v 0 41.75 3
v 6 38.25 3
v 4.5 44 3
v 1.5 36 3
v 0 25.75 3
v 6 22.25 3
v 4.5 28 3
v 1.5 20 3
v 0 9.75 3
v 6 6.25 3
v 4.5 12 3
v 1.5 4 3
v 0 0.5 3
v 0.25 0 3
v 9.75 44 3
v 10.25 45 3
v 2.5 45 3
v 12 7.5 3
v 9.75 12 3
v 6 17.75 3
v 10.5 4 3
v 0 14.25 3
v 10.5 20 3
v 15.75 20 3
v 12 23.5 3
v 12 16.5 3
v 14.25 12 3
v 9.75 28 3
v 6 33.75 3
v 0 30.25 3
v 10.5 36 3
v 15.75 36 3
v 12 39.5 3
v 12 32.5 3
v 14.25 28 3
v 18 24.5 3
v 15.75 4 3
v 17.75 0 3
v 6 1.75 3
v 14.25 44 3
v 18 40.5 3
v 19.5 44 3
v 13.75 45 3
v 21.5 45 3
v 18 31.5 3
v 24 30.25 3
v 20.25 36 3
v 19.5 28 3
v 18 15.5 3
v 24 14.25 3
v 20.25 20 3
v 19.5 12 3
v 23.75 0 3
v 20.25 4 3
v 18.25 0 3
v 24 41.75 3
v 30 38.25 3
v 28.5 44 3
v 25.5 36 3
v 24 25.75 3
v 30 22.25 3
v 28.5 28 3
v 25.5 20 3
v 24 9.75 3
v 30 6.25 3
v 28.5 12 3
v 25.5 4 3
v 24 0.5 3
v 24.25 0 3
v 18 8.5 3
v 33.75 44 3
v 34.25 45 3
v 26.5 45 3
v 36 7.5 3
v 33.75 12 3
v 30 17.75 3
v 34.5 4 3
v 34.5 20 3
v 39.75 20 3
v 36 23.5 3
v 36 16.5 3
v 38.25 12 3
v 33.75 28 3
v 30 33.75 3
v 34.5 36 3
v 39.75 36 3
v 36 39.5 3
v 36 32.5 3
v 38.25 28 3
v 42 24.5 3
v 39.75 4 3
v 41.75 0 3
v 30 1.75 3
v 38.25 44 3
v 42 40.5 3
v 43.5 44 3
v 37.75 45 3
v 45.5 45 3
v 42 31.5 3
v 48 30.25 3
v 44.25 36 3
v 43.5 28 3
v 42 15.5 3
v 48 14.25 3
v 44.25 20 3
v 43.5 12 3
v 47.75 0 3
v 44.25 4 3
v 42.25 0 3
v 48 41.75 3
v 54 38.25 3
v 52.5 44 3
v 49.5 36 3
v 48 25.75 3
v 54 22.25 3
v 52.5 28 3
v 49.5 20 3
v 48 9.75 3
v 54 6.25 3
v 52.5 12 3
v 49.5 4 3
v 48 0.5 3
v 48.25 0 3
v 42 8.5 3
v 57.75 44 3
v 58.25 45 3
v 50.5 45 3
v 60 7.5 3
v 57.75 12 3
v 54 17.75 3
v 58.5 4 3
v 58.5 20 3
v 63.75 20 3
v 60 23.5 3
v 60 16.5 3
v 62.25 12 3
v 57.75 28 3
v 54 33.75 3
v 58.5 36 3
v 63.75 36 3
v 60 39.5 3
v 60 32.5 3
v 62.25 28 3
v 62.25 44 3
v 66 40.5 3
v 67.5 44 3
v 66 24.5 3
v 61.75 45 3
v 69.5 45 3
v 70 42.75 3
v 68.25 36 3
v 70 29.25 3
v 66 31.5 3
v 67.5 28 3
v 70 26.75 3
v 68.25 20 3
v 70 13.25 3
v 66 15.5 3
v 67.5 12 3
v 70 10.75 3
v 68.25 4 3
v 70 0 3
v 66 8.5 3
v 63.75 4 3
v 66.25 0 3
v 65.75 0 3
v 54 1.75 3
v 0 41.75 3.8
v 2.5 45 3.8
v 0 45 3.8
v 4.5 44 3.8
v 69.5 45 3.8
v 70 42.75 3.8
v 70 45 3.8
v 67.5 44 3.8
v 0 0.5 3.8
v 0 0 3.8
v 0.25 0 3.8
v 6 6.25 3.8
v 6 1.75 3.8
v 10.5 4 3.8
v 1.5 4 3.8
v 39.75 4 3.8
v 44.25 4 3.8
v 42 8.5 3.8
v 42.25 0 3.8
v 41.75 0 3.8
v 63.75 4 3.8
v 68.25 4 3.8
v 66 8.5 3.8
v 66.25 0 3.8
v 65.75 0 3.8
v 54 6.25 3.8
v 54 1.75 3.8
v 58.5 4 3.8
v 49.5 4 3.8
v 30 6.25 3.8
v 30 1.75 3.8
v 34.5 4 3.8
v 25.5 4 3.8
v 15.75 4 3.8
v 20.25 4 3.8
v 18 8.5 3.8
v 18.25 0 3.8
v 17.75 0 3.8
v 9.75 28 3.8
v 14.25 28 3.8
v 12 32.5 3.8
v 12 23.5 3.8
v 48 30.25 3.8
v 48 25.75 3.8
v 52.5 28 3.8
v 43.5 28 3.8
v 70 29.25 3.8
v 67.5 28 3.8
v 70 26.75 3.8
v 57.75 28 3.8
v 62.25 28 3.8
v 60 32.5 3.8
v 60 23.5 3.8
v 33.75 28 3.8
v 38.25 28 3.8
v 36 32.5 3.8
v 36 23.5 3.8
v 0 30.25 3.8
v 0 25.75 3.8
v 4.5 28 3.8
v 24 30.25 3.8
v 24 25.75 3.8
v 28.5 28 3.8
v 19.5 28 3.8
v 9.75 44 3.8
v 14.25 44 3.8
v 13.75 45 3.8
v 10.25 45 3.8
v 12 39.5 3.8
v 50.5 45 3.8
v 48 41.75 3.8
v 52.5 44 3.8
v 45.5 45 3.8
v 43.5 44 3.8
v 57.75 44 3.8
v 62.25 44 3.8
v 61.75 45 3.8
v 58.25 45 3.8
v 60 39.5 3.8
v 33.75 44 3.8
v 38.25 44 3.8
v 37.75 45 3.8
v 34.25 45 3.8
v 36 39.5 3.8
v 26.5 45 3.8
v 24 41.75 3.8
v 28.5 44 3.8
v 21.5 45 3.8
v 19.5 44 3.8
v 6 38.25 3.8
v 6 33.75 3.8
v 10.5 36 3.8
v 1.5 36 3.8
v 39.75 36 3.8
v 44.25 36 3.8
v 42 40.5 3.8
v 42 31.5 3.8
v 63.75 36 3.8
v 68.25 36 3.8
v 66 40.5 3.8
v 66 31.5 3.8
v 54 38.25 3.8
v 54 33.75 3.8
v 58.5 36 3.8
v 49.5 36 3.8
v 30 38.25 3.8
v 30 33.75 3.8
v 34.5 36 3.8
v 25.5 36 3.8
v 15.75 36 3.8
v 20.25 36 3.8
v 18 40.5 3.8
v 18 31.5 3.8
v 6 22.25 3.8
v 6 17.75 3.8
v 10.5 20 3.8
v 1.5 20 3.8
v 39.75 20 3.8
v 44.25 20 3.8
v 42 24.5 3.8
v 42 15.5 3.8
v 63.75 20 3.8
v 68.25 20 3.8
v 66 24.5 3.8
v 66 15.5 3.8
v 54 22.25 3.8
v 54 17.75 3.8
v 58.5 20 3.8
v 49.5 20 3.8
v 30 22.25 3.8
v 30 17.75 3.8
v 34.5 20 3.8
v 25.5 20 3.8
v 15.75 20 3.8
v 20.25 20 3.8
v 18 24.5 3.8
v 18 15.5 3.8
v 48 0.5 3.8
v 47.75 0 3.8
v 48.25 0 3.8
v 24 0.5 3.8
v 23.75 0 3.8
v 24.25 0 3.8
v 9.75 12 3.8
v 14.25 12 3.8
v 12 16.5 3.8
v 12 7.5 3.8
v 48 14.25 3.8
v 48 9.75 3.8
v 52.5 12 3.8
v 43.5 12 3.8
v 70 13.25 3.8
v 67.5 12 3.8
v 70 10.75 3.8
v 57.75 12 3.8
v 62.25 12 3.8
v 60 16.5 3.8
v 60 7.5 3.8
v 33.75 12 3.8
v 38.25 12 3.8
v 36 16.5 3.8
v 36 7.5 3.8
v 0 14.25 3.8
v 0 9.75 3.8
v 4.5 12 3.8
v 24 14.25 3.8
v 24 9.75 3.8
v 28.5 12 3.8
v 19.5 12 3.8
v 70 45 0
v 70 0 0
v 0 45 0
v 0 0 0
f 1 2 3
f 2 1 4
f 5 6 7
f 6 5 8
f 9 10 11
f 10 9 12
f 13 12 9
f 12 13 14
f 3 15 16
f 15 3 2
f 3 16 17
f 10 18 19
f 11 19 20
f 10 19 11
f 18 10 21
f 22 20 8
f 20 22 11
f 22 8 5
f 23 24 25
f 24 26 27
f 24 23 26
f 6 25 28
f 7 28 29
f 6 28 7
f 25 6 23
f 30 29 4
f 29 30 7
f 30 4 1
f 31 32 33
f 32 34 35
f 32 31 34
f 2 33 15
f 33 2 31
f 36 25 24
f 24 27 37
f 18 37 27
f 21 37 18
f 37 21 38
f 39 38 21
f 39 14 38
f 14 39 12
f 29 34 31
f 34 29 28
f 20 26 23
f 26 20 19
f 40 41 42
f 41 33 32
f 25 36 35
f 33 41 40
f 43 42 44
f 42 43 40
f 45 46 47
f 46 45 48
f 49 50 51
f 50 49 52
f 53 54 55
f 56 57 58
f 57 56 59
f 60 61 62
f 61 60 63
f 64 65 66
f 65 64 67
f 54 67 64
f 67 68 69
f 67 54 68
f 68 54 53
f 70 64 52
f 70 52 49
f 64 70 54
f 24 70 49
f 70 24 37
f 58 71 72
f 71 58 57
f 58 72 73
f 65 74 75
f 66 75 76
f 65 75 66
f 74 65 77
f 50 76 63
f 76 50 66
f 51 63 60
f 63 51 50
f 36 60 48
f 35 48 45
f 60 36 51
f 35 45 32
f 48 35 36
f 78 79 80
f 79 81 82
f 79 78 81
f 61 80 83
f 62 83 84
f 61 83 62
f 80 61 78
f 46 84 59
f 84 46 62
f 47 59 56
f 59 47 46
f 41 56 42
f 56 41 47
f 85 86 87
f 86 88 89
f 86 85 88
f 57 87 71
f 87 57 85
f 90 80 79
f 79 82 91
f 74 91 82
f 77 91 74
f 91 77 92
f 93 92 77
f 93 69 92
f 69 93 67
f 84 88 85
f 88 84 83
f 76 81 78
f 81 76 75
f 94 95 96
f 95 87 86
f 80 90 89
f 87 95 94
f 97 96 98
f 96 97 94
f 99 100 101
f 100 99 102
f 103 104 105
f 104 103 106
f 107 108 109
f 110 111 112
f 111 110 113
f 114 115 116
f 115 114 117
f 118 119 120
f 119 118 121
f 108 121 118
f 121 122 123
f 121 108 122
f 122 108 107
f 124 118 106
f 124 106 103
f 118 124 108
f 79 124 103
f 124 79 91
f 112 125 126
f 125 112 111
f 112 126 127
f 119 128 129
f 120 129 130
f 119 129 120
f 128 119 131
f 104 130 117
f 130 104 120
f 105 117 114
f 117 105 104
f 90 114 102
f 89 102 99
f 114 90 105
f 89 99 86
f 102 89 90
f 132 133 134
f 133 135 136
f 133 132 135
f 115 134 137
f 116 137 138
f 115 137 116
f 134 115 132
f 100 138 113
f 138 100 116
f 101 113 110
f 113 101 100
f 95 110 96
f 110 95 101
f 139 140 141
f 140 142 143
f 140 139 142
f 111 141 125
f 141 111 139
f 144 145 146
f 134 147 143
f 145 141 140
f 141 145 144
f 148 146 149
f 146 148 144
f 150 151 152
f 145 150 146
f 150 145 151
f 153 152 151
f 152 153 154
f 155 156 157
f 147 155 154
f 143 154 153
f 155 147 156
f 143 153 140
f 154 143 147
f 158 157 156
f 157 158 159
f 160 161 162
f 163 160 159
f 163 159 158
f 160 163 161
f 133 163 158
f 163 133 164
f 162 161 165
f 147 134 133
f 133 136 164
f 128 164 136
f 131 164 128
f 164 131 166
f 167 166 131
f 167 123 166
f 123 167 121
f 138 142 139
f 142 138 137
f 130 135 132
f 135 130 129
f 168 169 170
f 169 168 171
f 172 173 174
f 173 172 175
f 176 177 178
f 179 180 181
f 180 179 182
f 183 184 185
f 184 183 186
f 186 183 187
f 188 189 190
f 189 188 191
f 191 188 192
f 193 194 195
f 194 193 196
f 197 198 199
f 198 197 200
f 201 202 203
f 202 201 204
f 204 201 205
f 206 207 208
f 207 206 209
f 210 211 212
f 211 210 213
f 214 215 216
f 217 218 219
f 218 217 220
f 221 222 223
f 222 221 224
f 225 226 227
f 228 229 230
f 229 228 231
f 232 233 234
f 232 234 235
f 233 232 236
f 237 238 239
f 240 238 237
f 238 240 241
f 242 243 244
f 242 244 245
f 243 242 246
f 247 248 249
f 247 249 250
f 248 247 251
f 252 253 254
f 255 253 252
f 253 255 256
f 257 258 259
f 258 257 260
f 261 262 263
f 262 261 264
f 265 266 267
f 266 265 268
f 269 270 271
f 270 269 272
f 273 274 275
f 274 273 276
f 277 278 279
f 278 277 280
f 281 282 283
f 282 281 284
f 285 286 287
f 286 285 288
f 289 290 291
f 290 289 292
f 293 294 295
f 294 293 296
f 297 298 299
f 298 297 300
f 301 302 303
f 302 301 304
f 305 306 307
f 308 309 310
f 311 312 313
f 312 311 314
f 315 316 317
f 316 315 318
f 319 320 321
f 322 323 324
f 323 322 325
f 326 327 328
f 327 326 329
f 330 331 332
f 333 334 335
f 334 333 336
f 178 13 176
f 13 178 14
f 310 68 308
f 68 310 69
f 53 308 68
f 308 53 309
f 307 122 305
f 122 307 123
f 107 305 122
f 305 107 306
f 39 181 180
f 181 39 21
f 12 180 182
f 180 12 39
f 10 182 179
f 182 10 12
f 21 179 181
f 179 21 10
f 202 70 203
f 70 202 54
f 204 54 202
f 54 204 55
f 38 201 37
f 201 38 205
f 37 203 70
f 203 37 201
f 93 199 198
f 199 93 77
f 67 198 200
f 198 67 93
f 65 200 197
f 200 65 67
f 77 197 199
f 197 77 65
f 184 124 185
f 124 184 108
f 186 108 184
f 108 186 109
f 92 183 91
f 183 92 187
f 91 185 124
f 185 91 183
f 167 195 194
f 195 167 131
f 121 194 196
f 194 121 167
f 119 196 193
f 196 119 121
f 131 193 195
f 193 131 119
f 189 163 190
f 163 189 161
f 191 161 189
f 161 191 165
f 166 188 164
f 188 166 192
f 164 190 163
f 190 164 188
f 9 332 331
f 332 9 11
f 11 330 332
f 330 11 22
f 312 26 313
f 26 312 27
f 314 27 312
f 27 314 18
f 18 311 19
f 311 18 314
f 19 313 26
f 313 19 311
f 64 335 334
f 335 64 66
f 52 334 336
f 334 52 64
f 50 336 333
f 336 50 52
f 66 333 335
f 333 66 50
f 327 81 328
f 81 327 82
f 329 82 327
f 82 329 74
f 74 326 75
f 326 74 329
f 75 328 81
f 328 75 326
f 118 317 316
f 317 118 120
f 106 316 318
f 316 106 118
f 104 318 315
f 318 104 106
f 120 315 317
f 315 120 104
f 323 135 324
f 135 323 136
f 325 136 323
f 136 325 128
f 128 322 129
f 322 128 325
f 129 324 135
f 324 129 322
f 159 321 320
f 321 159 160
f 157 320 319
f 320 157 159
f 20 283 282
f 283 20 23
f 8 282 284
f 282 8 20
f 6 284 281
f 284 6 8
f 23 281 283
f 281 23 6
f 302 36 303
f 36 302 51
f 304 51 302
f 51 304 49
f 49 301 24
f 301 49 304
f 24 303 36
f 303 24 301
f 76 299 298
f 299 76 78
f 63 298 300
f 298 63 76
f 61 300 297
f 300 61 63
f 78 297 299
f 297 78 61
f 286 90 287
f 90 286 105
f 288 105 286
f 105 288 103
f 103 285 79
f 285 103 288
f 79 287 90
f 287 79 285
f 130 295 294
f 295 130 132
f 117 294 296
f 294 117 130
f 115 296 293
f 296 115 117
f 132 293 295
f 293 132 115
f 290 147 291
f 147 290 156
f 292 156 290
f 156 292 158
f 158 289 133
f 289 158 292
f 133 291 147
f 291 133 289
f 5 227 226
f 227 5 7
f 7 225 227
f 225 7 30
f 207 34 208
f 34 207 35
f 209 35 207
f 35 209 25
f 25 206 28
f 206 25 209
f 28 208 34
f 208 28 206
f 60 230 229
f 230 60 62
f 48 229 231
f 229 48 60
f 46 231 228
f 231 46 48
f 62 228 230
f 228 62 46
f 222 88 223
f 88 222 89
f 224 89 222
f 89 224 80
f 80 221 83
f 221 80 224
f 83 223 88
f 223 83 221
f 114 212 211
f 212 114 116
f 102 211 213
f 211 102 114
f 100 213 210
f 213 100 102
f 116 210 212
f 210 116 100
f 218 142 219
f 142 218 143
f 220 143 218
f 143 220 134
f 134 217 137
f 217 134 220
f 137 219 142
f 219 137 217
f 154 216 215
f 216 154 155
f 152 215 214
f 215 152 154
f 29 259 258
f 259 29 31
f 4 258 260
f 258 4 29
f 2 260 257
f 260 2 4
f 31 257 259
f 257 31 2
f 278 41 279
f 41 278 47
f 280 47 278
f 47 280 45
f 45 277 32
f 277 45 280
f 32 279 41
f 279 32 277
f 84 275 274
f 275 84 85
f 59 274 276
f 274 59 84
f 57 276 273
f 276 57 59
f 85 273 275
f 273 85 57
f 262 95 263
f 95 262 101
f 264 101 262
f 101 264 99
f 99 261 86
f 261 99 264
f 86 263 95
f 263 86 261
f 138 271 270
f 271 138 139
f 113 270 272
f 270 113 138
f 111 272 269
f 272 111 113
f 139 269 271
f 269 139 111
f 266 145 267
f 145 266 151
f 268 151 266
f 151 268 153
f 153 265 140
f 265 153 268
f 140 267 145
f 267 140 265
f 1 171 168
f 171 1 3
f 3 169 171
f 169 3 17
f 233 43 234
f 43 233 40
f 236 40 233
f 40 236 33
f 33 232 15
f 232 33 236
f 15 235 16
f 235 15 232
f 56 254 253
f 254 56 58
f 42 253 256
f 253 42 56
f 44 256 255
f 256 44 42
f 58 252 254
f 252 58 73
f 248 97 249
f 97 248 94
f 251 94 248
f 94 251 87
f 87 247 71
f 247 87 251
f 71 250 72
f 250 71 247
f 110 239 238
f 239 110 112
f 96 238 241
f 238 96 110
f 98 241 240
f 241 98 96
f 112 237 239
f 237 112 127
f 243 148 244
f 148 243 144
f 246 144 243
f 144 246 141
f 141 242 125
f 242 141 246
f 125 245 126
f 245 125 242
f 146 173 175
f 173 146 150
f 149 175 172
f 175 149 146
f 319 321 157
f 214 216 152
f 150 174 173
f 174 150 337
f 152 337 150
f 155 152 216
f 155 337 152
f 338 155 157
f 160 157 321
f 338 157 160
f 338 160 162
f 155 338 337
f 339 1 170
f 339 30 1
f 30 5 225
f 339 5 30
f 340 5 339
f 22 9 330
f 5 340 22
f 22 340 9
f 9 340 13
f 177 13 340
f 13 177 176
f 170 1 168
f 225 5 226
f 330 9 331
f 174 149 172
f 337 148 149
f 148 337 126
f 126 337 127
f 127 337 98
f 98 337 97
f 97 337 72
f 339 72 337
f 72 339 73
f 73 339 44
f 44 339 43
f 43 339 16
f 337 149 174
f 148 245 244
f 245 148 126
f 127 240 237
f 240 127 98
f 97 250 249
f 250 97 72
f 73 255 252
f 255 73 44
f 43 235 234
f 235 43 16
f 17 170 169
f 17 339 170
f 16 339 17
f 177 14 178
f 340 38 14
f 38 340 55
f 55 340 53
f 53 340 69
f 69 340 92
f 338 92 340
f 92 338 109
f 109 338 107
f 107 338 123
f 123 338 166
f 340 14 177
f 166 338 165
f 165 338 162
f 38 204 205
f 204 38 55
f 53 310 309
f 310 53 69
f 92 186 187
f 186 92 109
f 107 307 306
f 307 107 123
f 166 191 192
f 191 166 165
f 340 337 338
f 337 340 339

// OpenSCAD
// Flat plate with a raised diamond tread pattern.
//$preview = true;
$fa = $preview ? 16 : 1;
$fs = $preview ? 3 : 0.15;

tread_width = 70;
tread_depth = 45;
tread_base_height = 3;
tread_height = 0.8;
diamond_width = 9;
diamond_depth = 4.5;
diamond_spacing_x = 12;
diamond_spacing_y = 8;

module raised_diamond(x, y, orientation = 0) {
    translate([x, y, tread_base_height])
        rotate([0, 0, orientation])
        linear_extrude(height = tread_height)
            polygon(points = [
                [-diamond_width / 2, 0],
                [0, diamond_depth / 2],
                [diamond_width / 2, 0],
                [0, -diamond_depth / 2]
            ]);
}

module diamond_tread_plate() {
    union() {
        cube([tread_width, tread_depth, tread_base_height]);

        intersection() {
            translate([0, 0, tread_base_height])
                cube([tread_width, tread_depth, tread_height]);

            union() {
                for (row = [-1 : ceil(tread_depth / diamond_spacing_y) + 1]) {
                    y = diamond_spacing_y / 2 + row * diamond_spacing_y;
                    row_offset = (row % 2) * diamond_spacing_x / 2;
                    for (column = [-1 : ceil(tread_width / diamond_spacing_x) + 1]) {
                        x = diamond_spacing_x / 2 + column * diamond_spacing_x + row_offset;
                        raised_diamond(x, y, (row + column) % 2 * 90);
                    }
                }
            }
        }
    }
}

diamond_tread_plate();
